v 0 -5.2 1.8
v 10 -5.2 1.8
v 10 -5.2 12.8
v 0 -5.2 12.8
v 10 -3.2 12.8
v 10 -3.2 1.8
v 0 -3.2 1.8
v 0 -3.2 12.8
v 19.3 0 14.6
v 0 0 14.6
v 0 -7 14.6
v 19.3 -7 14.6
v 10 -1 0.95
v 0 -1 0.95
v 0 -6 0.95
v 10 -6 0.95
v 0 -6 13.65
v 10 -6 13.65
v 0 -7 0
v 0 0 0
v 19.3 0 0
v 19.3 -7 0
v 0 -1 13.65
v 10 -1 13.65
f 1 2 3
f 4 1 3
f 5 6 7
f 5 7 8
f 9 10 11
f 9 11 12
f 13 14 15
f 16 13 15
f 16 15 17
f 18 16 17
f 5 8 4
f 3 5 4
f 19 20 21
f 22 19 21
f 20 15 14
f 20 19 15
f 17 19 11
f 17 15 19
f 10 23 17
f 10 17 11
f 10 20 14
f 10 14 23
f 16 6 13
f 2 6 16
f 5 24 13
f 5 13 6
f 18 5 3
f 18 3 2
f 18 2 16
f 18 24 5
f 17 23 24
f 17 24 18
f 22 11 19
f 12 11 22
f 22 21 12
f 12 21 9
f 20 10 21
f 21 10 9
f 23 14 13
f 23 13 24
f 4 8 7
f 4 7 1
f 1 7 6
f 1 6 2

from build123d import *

# Parameters (mm, degrees)
F0_W     = 19.3
F0_H     = 14.6
F1_DEPTH = 7
F2_W     = 5
F2_H     = 12.7
F3_DEPTH = 10
F4_W     = 2
F4_H     = 11
F5_DEPTH = 10


with BuildPart() as f1:
    # F0 (on Front) → F1 (new body)
    with BuildSketch(Plane.XZ):
        with Locations((9.65, 7.3)):
            Rectangle(F0_W, F0_H)
    extrude(amount=F1_DEPTH)

    # F2 (on face) → F3 (cut)
    with BuildSketch(Plane(origin=(0, 0, 0), x_dir=(0, -1, 0), z_dir=(-1, 0, 0))):
        with Locations((3.5, 7.3)):
            Rectangle(F2_W, F2_H)
    extrude(amount=-F3_DEPTH, mode=Mode.SUBTRACT)

    # F4 (on face) → F5 (join)
    with BuildSketch(Plane(origin=(10, 0, 0), x_dir=(0, -1, 0), z_dir=(-1, 0, 0))):
        with Locations((4.2, 7.3)):
            Rectangle(F4_W, F4_H)
    extrude(amount=F5_DEPTH)


solid = f1.part
